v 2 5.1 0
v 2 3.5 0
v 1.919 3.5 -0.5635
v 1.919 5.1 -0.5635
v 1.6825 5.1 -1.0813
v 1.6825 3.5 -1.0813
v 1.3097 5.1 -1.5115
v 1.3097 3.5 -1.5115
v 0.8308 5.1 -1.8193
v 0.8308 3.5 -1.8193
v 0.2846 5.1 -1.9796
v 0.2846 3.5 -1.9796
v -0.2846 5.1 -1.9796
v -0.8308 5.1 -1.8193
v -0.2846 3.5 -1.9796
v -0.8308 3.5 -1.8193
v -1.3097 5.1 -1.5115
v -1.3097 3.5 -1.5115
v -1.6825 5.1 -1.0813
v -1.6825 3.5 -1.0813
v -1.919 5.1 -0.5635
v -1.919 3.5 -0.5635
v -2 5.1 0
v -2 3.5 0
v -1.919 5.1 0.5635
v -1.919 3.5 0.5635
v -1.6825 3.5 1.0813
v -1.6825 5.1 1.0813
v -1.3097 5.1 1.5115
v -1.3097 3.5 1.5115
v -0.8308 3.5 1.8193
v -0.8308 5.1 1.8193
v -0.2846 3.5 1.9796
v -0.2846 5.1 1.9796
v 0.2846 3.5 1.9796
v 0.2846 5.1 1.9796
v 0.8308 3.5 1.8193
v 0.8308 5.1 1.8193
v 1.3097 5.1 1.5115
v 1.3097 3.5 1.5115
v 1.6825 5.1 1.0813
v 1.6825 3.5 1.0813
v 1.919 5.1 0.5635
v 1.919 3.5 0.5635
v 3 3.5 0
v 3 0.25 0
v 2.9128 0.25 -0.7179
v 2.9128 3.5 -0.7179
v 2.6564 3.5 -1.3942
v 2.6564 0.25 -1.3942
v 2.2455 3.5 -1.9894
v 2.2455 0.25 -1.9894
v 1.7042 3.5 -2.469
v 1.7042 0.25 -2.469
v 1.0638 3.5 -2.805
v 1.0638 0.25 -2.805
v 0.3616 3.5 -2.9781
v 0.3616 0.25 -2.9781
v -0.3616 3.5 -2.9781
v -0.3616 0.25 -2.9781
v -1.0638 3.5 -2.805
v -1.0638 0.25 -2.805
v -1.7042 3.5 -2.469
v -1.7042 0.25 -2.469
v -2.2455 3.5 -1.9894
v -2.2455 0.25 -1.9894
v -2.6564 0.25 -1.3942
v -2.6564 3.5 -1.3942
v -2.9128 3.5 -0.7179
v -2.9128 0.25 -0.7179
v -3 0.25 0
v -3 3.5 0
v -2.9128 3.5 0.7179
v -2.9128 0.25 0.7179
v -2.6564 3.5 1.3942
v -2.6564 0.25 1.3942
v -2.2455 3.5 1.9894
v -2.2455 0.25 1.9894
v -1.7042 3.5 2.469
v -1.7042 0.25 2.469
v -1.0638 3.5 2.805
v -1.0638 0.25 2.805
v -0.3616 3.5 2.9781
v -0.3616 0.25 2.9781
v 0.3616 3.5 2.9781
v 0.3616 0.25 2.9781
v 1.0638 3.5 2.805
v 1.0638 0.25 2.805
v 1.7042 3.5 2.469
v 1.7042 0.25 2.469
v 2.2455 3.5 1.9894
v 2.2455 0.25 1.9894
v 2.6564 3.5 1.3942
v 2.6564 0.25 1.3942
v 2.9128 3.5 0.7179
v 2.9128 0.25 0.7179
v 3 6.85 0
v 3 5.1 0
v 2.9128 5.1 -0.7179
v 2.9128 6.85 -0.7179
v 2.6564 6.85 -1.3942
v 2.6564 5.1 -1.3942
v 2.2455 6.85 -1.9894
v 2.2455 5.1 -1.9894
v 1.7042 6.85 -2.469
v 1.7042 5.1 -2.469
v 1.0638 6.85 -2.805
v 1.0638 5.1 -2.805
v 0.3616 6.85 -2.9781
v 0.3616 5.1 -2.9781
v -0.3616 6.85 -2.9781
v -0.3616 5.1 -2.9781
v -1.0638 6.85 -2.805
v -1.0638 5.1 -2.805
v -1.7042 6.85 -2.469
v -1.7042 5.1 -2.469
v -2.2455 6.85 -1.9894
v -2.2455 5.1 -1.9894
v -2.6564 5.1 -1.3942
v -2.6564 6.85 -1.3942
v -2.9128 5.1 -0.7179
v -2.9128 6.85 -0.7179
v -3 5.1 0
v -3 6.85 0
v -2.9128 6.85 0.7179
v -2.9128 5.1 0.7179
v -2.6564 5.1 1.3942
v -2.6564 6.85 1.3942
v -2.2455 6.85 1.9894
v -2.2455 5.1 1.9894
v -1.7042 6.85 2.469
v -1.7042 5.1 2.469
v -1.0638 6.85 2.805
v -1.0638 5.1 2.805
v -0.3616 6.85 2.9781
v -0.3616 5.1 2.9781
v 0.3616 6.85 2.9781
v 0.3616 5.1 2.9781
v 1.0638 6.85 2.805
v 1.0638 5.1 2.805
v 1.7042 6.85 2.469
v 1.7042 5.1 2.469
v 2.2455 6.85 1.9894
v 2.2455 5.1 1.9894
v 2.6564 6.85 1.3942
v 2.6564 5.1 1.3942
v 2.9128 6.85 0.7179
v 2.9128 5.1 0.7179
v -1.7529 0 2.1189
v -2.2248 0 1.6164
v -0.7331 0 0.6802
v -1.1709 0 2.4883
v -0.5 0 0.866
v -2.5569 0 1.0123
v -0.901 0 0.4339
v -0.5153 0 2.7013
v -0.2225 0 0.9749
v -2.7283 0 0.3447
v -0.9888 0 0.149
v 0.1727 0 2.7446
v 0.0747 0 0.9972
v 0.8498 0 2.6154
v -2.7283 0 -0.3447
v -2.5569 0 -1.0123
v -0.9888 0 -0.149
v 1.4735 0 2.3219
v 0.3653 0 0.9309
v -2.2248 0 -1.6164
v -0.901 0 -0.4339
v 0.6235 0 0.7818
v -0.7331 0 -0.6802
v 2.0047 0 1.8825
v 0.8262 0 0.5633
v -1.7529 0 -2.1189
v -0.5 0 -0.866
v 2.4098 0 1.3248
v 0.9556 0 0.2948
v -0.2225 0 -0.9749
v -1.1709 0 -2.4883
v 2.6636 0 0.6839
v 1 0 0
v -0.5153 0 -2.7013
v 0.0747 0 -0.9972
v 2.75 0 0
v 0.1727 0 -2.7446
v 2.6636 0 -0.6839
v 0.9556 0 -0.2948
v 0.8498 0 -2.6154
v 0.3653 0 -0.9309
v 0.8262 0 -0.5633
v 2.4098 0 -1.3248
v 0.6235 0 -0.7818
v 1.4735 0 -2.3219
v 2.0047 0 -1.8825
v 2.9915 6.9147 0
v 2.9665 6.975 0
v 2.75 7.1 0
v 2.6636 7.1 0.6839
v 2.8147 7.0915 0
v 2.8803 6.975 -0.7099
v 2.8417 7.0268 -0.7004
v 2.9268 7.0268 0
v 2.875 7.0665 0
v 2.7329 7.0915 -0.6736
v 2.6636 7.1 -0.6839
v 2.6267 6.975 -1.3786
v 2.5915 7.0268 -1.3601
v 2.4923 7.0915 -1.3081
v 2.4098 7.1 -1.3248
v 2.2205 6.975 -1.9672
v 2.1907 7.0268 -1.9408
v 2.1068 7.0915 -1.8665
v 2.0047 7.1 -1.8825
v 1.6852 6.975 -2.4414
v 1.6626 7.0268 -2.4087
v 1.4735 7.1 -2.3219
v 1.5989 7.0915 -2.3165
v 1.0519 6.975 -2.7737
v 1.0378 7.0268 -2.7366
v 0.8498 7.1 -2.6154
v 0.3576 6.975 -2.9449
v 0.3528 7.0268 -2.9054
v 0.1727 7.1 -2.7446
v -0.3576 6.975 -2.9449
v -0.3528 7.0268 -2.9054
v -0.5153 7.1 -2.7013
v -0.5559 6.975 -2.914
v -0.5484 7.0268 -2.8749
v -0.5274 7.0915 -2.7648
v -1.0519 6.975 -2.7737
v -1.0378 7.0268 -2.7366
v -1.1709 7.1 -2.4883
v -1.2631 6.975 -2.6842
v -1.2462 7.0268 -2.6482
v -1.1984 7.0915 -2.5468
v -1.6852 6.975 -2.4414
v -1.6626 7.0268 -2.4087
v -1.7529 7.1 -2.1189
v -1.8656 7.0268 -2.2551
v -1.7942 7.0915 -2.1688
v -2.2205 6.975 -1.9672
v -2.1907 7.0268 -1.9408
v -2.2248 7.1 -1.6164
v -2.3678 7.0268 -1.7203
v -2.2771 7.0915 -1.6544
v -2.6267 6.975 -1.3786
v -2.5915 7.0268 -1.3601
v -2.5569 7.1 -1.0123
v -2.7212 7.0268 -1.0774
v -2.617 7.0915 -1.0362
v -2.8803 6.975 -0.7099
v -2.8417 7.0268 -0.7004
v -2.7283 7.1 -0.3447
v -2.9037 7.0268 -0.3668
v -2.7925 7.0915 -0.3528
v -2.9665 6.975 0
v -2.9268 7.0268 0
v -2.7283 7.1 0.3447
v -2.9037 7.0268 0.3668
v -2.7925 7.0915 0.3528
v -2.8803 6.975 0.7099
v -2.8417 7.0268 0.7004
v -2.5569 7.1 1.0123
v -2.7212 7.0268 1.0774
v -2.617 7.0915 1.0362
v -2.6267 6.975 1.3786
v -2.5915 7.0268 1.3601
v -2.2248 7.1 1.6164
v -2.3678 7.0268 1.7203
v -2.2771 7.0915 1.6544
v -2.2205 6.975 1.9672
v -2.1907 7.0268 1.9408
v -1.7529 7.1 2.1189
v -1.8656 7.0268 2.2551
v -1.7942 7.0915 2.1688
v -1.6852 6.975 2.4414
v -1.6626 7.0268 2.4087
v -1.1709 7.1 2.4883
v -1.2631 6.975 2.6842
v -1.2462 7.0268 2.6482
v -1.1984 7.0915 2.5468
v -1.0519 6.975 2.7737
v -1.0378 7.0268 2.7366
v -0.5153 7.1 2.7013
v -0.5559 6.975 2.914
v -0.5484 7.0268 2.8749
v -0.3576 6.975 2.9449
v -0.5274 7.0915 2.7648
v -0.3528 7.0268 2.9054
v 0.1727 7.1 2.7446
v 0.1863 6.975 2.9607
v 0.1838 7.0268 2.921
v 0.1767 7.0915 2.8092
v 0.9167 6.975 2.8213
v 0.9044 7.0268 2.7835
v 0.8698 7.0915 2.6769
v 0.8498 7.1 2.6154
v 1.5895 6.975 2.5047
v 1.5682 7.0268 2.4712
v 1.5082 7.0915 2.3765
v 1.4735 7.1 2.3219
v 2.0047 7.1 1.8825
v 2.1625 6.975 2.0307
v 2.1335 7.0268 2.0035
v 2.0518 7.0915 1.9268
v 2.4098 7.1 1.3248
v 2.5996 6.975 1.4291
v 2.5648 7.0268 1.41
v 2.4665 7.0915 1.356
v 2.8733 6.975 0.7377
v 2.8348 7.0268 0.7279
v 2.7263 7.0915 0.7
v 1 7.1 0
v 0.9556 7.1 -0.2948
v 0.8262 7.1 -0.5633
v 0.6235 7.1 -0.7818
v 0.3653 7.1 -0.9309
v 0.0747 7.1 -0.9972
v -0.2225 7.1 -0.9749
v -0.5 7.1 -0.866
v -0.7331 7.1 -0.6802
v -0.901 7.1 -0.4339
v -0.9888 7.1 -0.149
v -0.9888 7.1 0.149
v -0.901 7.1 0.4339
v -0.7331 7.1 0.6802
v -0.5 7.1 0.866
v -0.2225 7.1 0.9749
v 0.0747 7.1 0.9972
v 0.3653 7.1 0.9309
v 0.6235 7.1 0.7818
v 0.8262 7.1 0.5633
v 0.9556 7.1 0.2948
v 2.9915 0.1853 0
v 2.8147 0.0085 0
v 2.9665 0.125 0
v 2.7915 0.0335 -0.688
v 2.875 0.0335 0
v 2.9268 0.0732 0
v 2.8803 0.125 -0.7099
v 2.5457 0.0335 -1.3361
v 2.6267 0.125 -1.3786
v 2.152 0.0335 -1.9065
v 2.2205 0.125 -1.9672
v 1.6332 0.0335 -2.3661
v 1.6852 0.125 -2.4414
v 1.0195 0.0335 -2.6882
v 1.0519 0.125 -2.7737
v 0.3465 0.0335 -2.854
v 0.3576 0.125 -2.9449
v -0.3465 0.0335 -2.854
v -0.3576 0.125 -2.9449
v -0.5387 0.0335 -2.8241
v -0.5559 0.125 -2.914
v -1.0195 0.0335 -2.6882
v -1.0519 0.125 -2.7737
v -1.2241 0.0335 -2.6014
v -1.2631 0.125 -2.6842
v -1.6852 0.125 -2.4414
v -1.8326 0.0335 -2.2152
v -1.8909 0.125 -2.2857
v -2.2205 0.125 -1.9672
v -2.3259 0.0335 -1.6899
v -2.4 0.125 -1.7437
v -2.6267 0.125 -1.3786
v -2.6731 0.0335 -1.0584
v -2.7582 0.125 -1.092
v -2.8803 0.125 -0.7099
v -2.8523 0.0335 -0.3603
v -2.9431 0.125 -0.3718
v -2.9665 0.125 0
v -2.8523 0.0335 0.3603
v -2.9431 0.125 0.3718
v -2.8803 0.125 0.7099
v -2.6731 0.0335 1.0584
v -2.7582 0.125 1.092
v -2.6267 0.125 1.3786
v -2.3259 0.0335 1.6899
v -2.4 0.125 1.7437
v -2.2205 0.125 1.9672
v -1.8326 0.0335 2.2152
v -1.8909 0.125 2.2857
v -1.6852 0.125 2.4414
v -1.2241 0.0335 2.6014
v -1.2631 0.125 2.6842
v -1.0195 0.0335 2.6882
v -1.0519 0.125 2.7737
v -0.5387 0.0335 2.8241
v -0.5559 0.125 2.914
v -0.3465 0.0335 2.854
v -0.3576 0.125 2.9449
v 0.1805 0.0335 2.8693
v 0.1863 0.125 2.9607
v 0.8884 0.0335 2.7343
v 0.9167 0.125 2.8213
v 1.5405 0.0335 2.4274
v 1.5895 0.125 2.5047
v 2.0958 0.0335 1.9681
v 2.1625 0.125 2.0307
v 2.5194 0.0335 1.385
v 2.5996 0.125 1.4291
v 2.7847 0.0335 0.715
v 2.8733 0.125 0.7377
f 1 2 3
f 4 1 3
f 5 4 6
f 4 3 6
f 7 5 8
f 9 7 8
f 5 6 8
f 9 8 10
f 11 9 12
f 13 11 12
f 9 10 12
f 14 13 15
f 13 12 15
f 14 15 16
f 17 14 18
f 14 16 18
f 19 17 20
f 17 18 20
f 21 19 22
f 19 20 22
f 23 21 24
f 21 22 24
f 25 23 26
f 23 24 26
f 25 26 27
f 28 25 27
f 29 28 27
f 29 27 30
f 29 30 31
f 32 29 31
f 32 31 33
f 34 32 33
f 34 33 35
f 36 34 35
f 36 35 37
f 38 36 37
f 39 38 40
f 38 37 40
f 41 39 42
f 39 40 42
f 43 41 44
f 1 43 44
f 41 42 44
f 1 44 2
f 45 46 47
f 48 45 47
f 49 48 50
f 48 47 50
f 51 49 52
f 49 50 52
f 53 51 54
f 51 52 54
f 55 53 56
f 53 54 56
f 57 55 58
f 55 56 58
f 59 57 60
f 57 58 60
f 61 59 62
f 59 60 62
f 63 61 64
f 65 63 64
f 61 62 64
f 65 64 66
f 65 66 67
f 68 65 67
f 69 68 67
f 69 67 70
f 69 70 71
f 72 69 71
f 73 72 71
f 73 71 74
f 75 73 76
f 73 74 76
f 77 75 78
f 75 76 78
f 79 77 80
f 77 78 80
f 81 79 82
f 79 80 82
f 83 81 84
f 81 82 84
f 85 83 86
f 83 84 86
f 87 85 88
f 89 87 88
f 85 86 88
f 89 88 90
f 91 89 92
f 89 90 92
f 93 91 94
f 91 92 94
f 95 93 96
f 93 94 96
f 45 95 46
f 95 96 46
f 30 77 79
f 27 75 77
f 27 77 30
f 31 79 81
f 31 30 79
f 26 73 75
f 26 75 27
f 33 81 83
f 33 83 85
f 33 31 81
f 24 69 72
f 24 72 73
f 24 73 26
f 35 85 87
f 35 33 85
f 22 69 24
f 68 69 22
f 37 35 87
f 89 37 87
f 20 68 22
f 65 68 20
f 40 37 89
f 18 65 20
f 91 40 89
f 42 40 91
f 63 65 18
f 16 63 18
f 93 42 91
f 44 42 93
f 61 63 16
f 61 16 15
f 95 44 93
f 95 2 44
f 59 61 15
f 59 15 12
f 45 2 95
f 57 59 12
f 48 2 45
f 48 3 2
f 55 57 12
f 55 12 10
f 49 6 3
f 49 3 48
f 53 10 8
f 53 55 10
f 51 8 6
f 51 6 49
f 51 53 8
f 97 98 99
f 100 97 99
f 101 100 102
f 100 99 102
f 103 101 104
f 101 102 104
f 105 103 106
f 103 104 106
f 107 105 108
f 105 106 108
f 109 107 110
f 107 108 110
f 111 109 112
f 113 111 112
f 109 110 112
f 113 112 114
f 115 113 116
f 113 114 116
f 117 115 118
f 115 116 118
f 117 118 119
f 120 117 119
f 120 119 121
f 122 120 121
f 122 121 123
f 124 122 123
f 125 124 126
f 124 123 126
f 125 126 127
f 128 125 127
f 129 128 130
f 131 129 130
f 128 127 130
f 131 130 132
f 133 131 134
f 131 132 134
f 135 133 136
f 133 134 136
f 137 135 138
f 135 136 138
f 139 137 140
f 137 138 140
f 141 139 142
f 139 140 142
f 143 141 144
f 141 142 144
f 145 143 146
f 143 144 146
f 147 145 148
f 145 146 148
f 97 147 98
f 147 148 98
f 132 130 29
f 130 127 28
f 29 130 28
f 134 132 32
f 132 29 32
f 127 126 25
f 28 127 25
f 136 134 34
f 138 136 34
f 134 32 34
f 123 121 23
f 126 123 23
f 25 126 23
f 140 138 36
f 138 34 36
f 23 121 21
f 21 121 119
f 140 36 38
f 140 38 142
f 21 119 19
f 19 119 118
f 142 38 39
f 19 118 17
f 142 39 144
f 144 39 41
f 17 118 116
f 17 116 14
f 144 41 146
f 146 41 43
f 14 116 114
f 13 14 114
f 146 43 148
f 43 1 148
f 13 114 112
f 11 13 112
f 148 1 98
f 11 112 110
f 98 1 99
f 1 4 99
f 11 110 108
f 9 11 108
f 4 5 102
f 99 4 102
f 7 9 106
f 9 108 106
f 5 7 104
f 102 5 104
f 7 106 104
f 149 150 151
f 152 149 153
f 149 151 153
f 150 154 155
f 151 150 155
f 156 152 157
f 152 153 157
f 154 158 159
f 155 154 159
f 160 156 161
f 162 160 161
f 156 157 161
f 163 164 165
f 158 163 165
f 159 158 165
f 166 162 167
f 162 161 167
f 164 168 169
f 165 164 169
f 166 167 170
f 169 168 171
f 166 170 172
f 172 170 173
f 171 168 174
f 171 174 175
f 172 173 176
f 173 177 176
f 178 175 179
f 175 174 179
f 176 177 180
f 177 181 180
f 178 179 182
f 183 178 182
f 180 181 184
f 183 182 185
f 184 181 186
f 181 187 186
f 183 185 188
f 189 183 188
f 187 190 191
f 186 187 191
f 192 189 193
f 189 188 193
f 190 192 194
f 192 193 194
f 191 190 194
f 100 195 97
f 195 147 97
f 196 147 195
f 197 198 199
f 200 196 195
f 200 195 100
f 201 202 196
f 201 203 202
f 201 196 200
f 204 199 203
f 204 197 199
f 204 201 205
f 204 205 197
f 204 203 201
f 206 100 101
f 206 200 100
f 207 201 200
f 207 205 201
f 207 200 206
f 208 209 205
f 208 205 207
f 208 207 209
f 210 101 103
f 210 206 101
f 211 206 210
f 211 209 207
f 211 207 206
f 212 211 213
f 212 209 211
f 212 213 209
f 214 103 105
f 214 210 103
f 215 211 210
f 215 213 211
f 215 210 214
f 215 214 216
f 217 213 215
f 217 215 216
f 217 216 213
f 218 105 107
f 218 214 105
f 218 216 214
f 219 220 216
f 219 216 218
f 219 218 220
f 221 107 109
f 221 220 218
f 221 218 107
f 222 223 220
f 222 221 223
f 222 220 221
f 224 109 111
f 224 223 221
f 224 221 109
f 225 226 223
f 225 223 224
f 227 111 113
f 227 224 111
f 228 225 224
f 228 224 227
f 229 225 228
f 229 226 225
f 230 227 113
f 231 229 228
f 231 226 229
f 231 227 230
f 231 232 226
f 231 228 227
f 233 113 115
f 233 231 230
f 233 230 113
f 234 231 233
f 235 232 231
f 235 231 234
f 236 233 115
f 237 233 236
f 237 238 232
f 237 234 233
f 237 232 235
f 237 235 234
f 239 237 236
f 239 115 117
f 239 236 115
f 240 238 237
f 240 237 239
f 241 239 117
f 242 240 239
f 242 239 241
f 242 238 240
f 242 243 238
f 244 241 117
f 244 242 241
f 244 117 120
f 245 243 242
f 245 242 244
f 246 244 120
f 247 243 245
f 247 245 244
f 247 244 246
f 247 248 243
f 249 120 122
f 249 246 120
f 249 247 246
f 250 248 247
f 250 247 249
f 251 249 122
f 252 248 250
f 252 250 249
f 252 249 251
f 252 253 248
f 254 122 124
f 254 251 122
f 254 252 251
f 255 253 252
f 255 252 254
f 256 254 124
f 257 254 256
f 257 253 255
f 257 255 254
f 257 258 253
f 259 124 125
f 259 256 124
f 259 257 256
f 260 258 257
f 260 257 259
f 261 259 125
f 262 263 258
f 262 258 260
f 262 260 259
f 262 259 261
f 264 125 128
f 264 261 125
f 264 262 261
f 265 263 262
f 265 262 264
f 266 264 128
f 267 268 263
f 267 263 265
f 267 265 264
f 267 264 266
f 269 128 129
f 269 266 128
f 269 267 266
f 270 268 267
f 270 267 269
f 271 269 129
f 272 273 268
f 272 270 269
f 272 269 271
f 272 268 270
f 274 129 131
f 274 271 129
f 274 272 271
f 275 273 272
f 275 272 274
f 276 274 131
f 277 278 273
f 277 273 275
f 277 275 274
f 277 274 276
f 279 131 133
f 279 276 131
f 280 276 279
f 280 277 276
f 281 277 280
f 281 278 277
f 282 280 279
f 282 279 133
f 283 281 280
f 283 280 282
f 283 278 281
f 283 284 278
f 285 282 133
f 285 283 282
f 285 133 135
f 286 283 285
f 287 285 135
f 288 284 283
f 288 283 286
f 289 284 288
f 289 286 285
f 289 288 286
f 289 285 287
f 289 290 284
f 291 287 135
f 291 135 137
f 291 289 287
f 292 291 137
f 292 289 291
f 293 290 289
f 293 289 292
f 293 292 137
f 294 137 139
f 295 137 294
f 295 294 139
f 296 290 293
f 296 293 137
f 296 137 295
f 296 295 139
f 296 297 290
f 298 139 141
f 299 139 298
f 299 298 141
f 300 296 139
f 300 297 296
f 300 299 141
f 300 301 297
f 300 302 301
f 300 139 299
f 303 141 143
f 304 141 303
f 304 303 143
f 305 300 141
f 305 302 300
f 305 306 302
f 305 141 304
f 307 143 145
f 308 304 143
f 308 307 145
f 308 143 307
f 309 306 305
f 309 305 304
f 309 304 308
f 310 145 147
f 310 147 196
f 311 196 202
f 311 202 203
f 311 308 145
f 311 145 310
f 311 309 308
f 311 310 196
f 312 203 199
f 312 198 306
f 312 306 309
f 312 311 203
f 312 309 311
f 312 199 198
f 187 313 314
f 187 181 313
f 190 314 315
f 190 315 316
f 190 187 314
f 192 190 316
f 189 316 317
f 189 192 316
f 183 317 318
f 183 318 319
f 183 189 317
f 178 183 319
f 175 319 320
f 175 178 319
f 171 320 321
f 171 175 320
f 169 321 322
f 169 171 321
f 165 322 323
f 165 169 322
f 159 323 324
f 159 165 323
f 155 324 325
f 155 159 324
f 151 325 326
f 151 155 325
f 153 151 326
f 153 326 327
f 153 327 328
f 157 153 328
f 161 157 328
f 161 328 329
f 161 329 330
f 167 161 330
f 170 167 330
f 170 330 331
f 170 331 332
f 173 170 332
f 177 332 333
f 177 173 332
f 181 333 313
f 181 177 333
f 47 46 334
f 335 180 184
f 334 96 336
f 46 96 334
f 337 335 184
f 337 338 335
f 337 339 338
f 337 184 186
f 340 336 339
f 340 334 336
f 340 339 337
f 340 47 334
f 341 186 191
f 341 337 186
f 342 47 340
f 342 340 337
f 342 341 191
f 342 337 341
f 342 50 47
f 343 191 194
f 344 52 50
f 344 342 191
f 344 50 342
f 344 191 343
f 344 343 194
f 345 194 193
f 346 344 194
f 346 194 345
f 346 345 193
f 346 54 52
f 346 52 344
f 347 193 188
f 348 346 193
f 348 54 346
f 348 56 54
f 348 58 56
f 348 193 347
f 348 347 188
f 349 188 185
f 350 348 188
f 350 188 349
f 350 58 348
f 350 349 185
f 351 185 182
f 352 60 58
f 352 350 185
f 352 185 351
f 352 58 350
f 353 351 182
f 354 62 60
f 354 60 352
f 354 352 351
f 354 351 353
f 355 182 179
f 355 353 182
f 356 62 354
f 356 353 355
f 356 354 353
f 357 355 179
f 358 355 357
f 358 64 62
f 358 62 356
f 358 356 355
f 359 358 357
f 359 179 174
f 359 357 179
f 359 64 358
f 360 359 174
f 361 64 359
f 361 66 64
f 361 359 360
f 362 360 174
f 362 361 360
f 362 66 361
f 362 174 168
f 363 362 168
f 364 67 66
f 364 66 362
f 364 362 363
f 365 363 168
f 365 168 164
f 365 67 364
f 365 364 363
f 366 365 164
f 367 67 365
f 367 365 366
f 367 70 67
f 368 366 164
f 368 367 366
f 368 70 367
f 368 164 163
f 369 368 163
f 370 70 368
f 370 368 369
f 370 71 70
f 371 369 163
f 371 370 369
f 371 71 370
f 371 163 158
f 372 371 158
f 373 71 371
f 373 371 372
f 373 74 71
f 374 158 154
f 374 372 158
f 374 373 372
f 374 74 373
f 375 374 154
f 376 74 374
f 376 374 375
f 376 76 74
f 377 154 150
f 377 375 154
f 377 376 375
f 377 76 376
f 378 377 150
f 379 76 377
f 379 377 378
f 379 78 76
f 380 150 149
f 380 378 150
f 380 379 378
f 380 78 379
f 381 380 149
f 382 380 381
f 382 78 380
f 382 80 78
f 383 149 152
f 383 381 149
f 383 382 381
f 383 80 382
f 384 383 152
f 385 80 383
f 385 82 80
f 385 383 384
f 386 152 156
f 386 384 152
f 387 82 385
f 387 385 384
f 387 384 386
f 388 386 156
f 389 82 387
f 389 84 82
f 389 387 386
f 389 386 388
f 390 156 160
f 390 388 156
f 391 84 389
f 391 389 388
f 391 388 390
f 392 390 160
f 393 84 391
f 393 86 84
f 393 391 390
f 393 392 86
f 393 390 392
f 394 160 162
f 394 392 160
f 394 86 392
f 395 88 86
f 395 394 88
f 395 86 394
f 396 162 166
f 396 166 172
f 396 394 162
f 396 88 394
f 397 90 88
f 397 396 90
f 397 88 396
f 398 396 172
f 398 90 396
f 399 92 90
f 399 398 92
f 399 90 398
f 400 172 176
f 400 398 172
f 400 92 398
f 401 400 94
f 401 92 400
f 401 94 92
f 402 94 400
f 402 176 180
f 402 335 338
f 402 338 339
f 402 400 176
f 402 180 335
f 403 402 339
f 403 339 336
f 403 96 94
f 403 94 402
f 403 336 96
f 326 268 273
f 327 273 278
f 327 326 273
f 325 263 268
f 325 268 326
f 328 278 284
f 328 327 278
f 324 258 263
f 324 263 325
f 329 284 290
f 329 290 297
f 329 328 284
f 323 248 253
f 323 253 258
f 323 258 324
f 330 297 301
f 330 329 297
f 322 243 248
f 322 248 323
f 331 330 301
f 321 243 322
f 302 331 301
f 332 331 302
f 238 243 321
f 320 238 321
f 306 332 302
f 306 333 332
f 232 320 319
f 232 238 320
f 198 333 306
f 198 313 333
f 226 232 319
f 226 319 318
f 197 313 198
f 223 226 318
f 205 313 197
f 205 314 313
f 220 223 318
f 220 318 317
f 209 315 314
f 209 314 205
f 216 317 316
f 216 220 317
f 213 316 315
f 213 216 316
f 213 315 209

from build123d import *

# Parameters (mm, degrees)
SKETCH1_R           = 3
SKETCH1_R_2         = 1
BOSS_EXTRUDE1_DEPTH = 3.5
SKETCH2_R           = 2
SKETCH2_R_2         = 1
BOSS_EXTRUDE2_DEPTH = 1.6
SKETCH3_R           = 3
SKETCH3_R_2         = 1
BOSS_EXTRUDE3_DEPTH = 2
FILLET1_R           = 0.25


with BuildPart() as part:
    # Sketch1 → Boss-Extrude1 (new body)
    with BuildSketch(Plane(origin=(0, 0, 0), x_dir=(1, 0, 0), z_dir=(0, 1, 0))):
        Circle(SKETCH1_R)
        Circle(SKETCH1_R_2, mode=Mode.SUBTRACT)
    extrude(amount=BOSS_EXTRUDE1_DEPTH)

    # Sketch2 → Boss-Extrude2 (add)
    with BuildSketch(Plane(origin=(0, 3.5, 0), x_dir=(1, 0, 0), z_dir=(0, 1, 0))):
        Circle(SKETCH2_R)
        Circle(SKETCH2_R_2, mode=Mode.SUBTRACT)
    extrude(amount=BOSS_EXTRUDE2_DEPTH)

    # Sketch3 → Boss-Extrude3 (add)
    with BuildSketch(Plane(origin=(0, 5.1, 0), x_dir=(1, 0, 0), z_dir=(0, 1, 0))):
        Circle(SKETCH3_R)
        Circle(SKETCH3_R_2, mode=Mode.SUBTRACT)
    extrude(amount=BOSS_EXTRUDE3_DEPTH)

    # Fillet1
    fillet1_edges = [part.edges().sort_by_distance(p)[0] for p in [
        (-3, 7.1, 0),
        (-3, 0, 0),
    ]]
    fillet(fillet1_edges, radius=FILLET1_R)


solid = part.part
